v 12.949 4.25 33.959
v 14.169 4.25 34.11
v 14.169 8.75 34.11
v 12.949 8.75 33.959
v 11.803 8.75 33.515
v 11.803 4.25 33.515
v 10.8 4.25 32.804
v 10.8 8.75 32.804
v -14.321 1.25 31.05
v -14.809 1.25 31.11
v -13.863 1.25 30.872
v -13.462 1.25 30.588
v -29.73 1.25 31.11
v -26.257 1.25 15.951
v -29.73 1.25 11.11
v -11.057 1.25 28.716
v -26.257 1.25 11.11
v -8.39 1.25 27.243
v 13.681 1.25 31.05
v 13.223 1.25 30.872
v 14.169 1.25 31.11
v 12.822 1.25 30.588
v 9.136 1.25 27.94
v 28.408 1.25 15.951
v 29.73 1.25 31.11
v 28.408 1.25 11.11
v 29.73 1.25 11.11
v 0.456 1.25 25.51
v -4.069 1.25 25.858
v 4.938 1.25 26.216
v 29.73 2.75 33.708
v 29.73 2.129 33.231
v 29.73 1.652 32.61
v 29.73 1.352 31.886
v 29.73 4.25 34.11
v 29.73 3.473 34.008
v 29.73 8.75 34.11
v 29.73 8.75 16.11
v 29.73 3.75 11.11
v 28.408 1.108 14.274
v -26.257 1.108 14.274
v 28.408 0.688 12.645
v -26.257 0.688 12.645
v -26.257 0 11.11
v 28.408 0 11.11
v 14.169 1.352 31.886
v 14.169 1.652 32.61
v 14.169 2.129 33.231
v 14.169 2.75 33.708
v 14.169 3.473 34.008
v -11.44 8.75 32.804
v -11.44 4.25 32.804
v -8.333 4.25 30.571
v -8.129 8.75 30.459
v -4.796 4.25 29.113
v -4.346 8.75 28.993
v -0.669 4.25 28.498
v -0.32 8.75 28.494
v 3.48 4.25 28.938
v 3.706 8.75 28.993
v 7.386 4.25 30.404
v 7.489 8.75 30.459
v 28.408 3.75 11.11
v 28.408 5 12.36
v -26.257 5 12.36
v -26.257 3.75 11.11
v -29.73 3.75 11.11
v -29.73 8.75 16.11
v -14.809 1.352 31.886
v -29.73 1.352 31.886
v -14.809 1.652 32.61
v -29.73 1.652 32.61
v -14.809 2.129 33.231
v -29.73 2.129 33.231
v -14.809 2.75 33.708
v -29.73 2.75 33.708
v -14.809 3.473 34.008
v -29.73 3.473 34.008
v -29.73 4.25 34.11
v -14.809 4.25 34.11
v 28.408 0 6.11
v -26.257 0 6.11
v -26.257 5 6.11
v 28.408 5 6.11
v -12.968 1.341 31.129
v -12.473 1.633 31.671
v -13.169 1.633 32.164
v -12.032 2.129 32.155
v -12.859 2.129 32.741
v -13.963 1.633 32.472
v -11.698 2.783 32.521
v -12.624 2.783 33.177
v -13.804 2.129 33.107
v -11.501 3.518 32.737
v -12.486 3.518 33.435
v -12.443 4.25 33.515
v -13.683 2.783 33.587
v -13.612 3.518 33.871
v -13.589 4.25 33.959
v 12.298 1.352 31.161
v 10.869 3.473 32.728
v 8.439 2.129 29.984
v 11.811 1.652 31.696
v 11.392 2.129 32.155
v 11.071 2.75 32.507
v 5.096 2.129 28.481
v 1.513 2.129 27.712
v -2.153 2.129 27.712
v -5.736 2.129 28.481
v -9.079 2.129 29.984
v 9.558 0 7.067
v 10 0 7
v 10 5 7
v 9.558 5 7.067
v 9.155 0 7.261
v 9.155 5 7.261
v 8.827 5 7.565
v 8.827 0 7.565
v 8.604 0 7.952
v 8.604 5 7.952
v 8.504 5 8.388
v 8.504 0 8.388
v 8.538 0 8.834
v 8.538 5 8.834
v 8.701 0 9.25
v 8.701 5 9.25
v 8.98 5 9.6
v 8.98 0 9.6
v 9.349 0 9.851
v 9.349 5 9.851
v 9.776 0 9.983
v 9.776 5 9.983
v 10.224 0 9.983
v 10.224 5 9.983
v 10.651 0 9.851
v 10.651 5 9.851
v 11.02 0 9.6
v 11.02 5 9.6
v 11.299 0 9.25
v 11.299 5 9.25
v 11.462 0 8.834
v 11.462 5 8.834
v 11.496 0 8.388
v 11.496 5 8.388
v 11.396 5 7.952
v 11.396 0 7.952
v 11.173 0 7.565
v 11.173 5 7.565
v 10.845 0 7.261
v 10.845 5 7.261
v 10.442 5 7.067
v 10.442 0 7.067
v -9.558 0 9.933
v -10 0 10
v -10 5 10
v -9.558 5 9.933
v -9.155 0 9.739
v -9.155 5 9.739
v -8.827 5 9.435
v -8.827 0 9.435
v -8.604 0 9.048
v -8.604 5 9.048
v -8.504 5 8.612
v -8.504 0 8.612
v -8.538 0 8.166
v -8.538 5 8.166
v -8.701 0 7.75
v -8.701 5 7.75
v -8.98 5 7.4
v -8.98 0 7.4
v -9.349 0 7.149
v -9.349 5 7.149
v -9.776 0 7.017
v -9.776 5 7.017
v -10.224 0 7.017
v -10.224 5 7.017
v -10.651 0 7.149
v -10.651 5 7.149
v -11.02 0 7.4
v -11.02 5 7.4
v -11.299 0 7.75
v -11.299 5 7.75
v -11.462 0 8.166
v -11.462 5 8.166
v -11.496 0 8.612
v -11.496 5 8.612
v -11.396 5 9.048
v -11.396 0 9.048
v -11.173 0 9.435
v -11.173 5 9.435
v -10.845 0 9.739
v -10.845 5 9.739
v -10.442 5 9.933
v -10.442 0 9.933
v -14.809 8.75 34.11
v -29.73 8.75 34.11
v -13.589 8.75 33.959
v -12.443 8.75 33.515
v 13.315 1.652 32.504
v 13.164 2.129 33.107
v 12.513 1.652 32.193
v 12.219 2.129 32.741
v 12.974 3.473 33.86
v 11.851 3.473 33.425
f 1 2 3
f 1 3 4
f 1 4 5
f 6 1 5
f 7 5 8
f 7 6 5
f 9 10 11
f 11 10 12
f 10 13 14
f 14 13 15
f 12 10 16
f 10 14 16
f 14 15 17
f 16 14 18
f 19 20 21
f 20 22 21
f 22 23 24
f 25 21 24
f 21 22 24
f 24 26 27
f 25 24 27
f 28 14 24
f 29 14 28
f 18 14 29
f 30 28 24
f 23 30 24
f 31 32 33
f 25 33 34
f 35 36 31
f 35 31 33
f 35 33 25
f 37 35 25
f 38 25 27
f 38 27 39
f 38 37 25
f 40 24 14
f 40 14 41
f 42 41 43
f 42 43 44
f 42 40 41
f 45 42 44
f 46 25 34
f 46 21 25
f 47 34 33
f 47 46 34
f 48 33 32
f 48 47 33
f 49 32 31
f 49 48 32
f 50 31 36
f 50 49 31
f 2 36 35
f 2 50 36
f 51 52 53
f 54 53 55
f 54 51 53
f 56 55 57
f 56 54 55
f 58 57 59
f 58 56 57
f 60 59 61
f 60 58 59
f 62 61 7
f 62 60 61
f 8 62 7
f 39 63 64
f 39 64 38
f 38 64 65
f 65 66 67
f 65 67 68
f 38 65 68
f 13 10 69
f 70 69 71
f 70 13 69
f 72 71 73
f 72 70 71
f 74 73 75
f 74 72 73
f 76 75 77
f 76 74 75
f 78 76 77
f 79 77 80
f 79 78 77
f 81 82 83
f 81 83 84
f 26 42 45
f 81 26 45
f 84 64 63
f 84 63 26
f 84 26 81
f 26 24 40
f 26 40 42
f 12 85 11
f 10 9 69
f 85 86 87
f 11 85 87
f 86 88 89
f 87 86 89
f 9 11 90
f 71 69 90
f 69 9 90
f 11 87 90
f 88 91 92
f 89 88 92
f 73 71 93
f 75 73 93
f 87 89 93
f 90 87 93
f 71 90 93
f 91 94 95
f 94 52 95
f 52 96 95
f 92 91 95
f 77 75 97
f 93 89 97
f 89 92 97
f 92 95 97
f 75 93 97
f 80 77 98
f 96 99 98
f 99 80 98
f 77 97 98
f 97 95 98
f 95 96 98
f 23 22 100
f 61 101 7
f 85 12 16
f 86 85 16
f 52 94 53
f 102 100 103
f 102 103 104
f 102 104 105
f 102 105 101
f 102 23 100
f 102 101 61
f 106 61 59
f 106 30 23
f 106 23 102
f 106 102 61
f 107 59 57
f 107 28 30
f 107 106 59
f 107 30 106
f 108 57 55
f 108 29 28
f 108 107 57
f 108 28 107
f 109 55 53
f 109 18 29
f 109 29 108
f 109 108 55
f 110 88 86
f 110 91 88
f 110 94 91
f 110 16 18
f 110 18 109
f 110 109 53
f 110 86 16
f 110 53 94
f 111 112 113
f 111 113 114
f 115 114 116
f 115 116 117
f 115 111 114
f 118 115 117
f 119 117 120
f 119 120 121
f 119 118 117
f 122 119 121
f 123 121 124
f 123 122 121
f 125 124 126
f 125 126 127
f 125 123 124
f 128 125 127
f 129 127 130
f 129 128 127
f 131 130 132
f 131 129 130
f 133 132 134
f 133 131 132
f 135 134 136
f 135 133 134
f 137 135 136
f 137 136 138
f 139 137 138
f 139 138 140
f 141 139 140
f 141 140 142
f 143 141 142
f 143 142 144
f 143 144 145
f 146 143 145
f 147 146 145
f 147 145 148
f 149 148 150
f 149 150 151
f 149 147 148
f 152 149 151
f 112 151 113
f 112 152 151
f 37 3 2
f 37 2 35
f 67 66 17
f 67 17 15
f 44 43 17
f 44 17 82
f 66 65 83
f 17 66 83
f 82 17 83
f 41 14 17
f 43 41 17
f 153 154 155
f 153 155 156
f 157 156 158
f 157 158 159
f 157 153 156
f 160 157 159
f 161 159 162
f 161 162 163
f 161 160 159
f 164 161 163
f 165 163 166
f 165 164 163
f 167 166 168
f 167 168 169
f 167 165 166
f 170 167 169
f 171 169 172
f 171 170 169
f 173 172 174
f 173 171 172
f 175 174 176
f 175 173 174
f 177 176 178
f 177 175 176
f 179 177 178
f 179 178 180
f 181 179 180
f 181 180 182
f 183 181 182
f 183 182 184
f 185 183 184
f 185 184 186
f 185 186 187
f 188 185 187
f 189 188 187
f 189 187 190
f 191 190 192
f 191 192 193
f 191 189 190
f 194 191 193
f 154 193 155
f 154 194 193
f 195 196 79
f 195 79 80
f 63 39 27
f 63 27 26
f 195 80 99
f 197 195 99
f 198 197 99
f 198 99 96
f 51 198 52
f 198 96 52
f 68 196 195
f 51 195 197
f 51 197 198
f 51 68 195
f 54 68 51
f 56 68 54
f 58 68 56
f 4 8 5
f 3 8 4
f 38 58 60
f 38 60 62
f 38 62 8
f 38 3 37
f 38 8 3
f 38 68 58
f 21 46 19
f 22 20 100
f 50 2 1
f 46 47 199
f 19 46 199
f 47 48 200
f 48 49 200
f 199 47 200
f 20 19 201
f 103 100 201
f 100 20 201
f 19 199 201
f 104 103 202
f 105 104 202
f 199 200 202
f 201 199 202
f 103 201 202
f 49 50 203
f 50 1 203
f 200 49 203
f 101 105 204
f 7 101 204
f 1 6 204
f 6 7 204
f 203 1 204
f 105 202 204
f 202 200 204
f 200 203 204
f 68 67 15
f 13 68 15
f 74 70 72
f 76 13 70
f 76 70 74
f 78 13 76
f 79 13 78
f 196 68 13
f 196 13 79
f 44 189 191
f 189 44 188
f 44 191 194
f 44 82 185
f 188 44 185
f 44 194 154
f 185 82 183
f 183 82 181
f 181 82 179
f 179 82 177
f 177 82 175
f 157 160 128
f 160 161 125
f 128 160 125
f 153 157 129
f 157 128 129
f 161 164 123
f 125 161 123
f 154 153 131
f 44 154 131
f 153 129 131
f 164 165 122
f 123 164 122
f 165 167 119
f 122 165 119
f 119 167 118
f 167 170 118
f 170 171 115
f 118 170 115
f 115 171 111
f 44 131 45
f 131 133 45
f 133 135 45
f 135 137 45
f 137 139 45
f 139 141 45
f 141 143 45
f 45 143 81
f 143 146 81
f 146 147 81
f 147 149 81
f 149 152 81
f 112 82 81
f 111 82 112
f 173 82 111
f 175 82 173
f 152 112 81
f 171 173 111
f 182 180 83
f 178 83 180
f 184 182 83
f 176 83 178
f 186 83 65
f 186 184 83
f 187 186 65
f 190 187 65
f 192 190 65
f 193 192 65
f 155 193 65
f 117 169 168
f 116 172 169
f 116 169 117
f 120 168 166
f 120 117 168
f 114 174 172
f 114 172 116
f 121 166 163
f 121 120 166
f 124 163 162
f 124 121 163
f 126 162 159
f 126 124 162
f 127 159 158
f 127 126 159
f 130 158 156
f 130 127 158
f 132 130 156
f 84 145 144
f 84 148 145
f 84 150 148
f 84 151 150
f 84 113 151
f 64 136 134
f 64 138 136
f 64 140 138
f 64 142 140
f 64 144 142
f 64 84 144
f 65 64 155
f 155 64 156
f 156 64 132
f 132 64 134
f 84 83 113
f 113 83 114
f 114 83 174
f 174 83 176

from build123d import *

# Parameters (mm, degrees)
SKETCH_1_W          = 54.664318292
SKETCH_1_H          = 5
SKETCH_1_R          = 1.5
EXTRUDE_1_DEPTH     = 5
SKETCH_2_W          = 59.460193076
SKETCH_2_H          = 2.500348526
EXTRUDE_2_DEPTH     = 23
SKETCH_5_R          = 16.5
CUT_EXTRUDE_1_DEPTH = 15
EXTRUDE_START       = 5
EXTRUDE_3_DEPTH     = 5
CHAMFER_1_SIZE      = 5
FILLET_6_R          = 10
FILLET_7_R          = 5
FILLET_8_R          = 3


with BuildPart() as part:
    # 草图1 → 凸台-拉伸1 (new body)
    with BuildSketch(Plane(origin=(0, 0, 0), x_dir=(1, 0, 0), z_dir=(0, 1, 0))):
        with Locations((1.075531559, -8.61)):
            Rectangle(SKETCH_1_W, SKETCH_1_H)
        with Locations(Location((-10, -8.5, 0), (0, 0, 270))):
            Circle(SKETCH_1_R, mode=Mode.SUBTRACT)
        with Locations(Location((10, -8.5, 0), (0, 0, 90))):
            Circle(SKETCH_1_R, mode=Mode.SUBTRACT)
    extrude(amount=EXTRUDE_1_DEPTH)

    # 草图2 → 凸台-拉伸2 (add)
    with BuildSketch(Plane.XY.offset(11.11)):
        with Locations((0, 2.5)):
            Rectangle(SKETCH_2_W, SKETCH_2_H)
    extrude(amount=EXTRUDE_2_DEPTH)

    # 草图5 → 切除-拉伸1 (cut)
    with BuildSketch(Plane(origin=(0, 3.750174263, 0), x_dir=(1, 0, 0), z_dir=(0, 1, 0))):
        with Locations((-0.32, -44.994124541)):
            Circle(SKETCH_5_R)
    extrude(amount=-CUT_EXTRUDE_1_DEPTH, mode=Mode.SUBTRACT)

    # 草图7 → 凸台-拉伸3 (add)
    with BuildSketch(Plane(origin=(0, 3.750174263, 0), x_dir=(1, 0, 0), z_dir=(0, 1, 0)).offset(EXTRUDE_START)):
        with BuildLine():
            Line((-29.730096538, -34.11), (-12.721041608, -34.11))
            ThreePointArc((-12.721041608, -34.11), (-0.32, -28.494124541), (12.081041608, -34.11))
            Line((12.081041608, -34.11), (29.730096538, -34.11))
            Line((29.730096538, -34.11), (29.730096538, -11.11))
            Line((29.730096538, -11.11), (28.407690705, -11.11))
            Line((28.407690705, -11.11), (-26.256627587, -11.11))
            Line((-26.256627587, -11.11), (-29.730096538, -11.11))
            Line((-29.730096538, -11.11), (-29.730096538, -34.11))
        make_face()
    extrude(amount=-EXTRUDE_3_DEPTH)

    # 倒角1
    # the kernel refuses this chamfer: 5 mm, written as the material it takes off along each edge
    with BuildSketch(Plane(origin=(-42.588511478, 8.750174263, 11.11), x_dir=(0, -0.9996219169112968, -0.027495876610586317), z_dir=(1, 0, 0))) as chamfer_1_piece_1_section:
        Polygon((CHAMFER_1_SIZE * 0.999621916911, -CHAMFER_1_SIZE * 0.0274958766106), (-CHAMFER_1_SIZE * 0.0274958766106, -CHAMFER_1_SIZE * 0.999621916911), (0, 0), align=None)
    chamfer_1_piece_1 = extrude(amount=85.177022955, mode=Mode.PRIVATE)
    chamfer_1_piece_1 = split(chamfer_1_piece_1, bisect_by=Plane(origin=(-34.422569532, 5, 11.399404242), z_dir=(0, -1, 0)), keep=Keep.TOP, mode=Mode.PRIVATE)
    chamfer_1_piece_1 = split(chamfer_1_piece_1, bisect_by=Plane(origin=(-26.256627587, 4.506210637, 11.399404242), z_dir=(-1, 0, 0)), keep=Keep.TOP, mode=Mode.PRIVATE)
    add(chamfer_1_piece_1, mode=Mode.SUBTRACT)
    with BuildSketch(Plane(origin=(-42.588511478, 8.750174263, 11.11), x_dir=(0, -0.9996219169112968, -0.027495876610586317), z_dir=(1, 0, 0))) as chamfer_1_piece_2_section:
        Polygon((CHAMFER_1_SIZE * 0.999621916911, -CHAMFER_1_SIZE * 0.0274958766106), (-CHAMFER_1_SIZE * 0.0274958766106, -CHAMFER_1_SIZE * 0.999621916911), (0, 0), align=None)
    chamfer_1_piece_2 = extrude(amount=85.177022955, mode=Mode.PRIVATE)
    chamfer_1_piece_2 = split(chamfer_1_piece_2, bisect_by=Plane(origin=(-34.422569532, 5, 12.869772417), z_dir=(0, 1, 0)), keep=Keep.TOP, mode=Mode.PRIVATE)
    chamfer_1_piece_2 = split(chamfer_1_piece_2, bisect_by=Plane(origin=(-26.256627587, 7.312697929, 12.869772417), z_dir=(-1, 0, 0)), keep=Keep.TOP, mode=Mode.PRIVATE)
    add(chamfer_1_piece_2, mode=Mode.SUBTRACT)
    with BuildSketch(Plane(origin=(-42.588511478, 8.750174263, 11.11), x_dir=(0, -0.9996219169112968, -0.027495876610586317), z_dir=(1, 0, 0))) as chamfer_1_piece_3_section:
        Polygon((CHAMFER_1_SIZE * 0.999621916911, -CHAMFER_1_SIZE * 0.0274958766106), (-CHAMFER_1_SIZE * 0.0274958766106, -CHAMFER_1_SIZE * 0.999621916911), (0, 0), align=None)
    chamfer_1_piece_3 = extrude(amount=85.177022955, mode=Mode.PRIVATE)
    chamfer_1_piece_3 = split(chamfer_1_piece_3, bisect_by=Plane(origin=(1.075531559, 5, 12.869772417), z_dir=(0, 1, 0)), keep=Keep.TOP, mode=Mode.PRIVATE)
    chamfer_1_piece_3 = split(chamfer_1_piece_3, bisect_by=Plane(origin=(28.407690705, 7.312697929, 12.869772417), z_dir=(-1, 0, 0)), keep=Keep.TOP, mode=Mode.PRIVATE)
    chamfer_1_piece_3 = split(chamfer_1_piece_3, bisect_by=Plane(origin=(-26.256627587, 7.312697929, 12.869772417), z_dir=(1, 0, 0)), keep=Keep.TOP, mode=Mode.PRIVATE)
    add(chamfer_1_piece_3, mode=Mode.SUBTRACT)
    with BuildSketch(Plane(origin=(-42.588511478, 8.750174263, 11.11), x_dir=(0, -0.9996219169112968, -0.027495876610586317), z_dir=(1, 0, 0))) as chamfer_1_piece_4_section:
        Polygon((CHAMFER_1_SIZE * 0.999621916911, -CHAMFER_1_SIZE * 0.0274958766106), (-CHAMFER_1_SIZE * 0.0274958766106, -CHAMFER_1_SIZE * 0.999621916911), (0, 0), align=None)
    chamfer_1_piece_4 = extrude(amount=85.177022955, mode=Mode.PRIVATE)
    chamfer_1_piece_4 = split(chamfer_1_piece_4, bisect_by=Plane(origin=(35.498101091, 5, 11.399404242), z_dir=(0, -1, 0)), keep=Keep.TOP, mode=Mode.PRIVATE)
    chamfer_1_piece_4 = split(chamfer_1_piece_4, bisect_by=Plane(origin=(28.407690705, 4.506210637, 11.399404242), z_dir=(1, 0, 0)), keep=Keep.TOP, mode=Mode.PRIVATE)
    add(chamfer_1_piece_4, mode=Mode.SUBTRACT)
    with BuildSketch(Plane(origin=(-42.588511478, 8.750174263, 11.11), x_dir=(0, -0.9996219169112968, -0.027495876610586317), z_dir=(1, 0, 0))) as chamfer_1_piece_5_section:
        Polygon((CHAMFER_1_SIZE * 0.999621916911, -CHAMFER_1_SIZE * 0.0274958766106), (-CHAMFER_1_SIZE * 0.0274958766106, -CHAMFER_1_SIZE * 0.999621916911), (0, 0), align=None)
    chamfer_1_piece_5 = extrude(amount=85.177022955, mode=Mode.PRIVATE)
    chamfer_1_piece_5 = split(chamfer_1_piece_5, bisect_by=Plane(origin=(35.498101091, 5, 12.869772417), z_dir=(0, 1, 0)), keep=Keep.TOP, mode=Mode.PRIVATE)
    chamfer_1_piece_5 = split(chamfer_1_piece_5, bisect_by=Plane(origin=(28.407690705, 7.312697929, 12.869772417), z_dir=(1, 0, 0)), keep=Keep.TOP, mode=Mode.PRIVATE)
    add(chamfer_1_piece_5, mode=Mode.SUBTRACT)

    # 圆角6
    # the kernel refuses this fillet: 10 mm, written as the material it adds along each edge
    with BuildSketch(Plane(origin=(28.407690705, 1.249825737, 11.11), x_dir=(0, 0, 1), z_dir=(-1, 0, 0))) as fillet_6_piece_1:
        with BuildLine():
            CenterArc((4.840914208, -10), FILLET_6_R, 90, 28.952961909)
            Line((0, -1.249825737), (0, 0))
            Line((0, 0), (4.840914208, 0))
        make_face()
    extrude(amount=54.664318292)

    # 圆角7
    fillet_7_edges = [part.edges().sort_by_distance(p)[0] for p in [
        (-12.721041608, 5, 34.11),
        (12.081041608, 5, 34.11),
    ]]
    fillet(fillet_7_edges, radius=FILLET_7_R)

    # 圆角8
    fillet_8_edges = [part.edges().sort_by_distance(p)[0] for p in [
        (-0.32, 1.249825737, 28.494124541),
        (21.949780623, 1.249825737, 34.11),
        (-13.002521469, 1.249825737, 33.772076375),
        (12.362521469, 1.249825737, 33.772076375),
        (-22.269780623, 1.249825737, 34.11),
    ]]
    fillet(fillet_8_edges, radius=FILLET_8_R)


solid = part.part
